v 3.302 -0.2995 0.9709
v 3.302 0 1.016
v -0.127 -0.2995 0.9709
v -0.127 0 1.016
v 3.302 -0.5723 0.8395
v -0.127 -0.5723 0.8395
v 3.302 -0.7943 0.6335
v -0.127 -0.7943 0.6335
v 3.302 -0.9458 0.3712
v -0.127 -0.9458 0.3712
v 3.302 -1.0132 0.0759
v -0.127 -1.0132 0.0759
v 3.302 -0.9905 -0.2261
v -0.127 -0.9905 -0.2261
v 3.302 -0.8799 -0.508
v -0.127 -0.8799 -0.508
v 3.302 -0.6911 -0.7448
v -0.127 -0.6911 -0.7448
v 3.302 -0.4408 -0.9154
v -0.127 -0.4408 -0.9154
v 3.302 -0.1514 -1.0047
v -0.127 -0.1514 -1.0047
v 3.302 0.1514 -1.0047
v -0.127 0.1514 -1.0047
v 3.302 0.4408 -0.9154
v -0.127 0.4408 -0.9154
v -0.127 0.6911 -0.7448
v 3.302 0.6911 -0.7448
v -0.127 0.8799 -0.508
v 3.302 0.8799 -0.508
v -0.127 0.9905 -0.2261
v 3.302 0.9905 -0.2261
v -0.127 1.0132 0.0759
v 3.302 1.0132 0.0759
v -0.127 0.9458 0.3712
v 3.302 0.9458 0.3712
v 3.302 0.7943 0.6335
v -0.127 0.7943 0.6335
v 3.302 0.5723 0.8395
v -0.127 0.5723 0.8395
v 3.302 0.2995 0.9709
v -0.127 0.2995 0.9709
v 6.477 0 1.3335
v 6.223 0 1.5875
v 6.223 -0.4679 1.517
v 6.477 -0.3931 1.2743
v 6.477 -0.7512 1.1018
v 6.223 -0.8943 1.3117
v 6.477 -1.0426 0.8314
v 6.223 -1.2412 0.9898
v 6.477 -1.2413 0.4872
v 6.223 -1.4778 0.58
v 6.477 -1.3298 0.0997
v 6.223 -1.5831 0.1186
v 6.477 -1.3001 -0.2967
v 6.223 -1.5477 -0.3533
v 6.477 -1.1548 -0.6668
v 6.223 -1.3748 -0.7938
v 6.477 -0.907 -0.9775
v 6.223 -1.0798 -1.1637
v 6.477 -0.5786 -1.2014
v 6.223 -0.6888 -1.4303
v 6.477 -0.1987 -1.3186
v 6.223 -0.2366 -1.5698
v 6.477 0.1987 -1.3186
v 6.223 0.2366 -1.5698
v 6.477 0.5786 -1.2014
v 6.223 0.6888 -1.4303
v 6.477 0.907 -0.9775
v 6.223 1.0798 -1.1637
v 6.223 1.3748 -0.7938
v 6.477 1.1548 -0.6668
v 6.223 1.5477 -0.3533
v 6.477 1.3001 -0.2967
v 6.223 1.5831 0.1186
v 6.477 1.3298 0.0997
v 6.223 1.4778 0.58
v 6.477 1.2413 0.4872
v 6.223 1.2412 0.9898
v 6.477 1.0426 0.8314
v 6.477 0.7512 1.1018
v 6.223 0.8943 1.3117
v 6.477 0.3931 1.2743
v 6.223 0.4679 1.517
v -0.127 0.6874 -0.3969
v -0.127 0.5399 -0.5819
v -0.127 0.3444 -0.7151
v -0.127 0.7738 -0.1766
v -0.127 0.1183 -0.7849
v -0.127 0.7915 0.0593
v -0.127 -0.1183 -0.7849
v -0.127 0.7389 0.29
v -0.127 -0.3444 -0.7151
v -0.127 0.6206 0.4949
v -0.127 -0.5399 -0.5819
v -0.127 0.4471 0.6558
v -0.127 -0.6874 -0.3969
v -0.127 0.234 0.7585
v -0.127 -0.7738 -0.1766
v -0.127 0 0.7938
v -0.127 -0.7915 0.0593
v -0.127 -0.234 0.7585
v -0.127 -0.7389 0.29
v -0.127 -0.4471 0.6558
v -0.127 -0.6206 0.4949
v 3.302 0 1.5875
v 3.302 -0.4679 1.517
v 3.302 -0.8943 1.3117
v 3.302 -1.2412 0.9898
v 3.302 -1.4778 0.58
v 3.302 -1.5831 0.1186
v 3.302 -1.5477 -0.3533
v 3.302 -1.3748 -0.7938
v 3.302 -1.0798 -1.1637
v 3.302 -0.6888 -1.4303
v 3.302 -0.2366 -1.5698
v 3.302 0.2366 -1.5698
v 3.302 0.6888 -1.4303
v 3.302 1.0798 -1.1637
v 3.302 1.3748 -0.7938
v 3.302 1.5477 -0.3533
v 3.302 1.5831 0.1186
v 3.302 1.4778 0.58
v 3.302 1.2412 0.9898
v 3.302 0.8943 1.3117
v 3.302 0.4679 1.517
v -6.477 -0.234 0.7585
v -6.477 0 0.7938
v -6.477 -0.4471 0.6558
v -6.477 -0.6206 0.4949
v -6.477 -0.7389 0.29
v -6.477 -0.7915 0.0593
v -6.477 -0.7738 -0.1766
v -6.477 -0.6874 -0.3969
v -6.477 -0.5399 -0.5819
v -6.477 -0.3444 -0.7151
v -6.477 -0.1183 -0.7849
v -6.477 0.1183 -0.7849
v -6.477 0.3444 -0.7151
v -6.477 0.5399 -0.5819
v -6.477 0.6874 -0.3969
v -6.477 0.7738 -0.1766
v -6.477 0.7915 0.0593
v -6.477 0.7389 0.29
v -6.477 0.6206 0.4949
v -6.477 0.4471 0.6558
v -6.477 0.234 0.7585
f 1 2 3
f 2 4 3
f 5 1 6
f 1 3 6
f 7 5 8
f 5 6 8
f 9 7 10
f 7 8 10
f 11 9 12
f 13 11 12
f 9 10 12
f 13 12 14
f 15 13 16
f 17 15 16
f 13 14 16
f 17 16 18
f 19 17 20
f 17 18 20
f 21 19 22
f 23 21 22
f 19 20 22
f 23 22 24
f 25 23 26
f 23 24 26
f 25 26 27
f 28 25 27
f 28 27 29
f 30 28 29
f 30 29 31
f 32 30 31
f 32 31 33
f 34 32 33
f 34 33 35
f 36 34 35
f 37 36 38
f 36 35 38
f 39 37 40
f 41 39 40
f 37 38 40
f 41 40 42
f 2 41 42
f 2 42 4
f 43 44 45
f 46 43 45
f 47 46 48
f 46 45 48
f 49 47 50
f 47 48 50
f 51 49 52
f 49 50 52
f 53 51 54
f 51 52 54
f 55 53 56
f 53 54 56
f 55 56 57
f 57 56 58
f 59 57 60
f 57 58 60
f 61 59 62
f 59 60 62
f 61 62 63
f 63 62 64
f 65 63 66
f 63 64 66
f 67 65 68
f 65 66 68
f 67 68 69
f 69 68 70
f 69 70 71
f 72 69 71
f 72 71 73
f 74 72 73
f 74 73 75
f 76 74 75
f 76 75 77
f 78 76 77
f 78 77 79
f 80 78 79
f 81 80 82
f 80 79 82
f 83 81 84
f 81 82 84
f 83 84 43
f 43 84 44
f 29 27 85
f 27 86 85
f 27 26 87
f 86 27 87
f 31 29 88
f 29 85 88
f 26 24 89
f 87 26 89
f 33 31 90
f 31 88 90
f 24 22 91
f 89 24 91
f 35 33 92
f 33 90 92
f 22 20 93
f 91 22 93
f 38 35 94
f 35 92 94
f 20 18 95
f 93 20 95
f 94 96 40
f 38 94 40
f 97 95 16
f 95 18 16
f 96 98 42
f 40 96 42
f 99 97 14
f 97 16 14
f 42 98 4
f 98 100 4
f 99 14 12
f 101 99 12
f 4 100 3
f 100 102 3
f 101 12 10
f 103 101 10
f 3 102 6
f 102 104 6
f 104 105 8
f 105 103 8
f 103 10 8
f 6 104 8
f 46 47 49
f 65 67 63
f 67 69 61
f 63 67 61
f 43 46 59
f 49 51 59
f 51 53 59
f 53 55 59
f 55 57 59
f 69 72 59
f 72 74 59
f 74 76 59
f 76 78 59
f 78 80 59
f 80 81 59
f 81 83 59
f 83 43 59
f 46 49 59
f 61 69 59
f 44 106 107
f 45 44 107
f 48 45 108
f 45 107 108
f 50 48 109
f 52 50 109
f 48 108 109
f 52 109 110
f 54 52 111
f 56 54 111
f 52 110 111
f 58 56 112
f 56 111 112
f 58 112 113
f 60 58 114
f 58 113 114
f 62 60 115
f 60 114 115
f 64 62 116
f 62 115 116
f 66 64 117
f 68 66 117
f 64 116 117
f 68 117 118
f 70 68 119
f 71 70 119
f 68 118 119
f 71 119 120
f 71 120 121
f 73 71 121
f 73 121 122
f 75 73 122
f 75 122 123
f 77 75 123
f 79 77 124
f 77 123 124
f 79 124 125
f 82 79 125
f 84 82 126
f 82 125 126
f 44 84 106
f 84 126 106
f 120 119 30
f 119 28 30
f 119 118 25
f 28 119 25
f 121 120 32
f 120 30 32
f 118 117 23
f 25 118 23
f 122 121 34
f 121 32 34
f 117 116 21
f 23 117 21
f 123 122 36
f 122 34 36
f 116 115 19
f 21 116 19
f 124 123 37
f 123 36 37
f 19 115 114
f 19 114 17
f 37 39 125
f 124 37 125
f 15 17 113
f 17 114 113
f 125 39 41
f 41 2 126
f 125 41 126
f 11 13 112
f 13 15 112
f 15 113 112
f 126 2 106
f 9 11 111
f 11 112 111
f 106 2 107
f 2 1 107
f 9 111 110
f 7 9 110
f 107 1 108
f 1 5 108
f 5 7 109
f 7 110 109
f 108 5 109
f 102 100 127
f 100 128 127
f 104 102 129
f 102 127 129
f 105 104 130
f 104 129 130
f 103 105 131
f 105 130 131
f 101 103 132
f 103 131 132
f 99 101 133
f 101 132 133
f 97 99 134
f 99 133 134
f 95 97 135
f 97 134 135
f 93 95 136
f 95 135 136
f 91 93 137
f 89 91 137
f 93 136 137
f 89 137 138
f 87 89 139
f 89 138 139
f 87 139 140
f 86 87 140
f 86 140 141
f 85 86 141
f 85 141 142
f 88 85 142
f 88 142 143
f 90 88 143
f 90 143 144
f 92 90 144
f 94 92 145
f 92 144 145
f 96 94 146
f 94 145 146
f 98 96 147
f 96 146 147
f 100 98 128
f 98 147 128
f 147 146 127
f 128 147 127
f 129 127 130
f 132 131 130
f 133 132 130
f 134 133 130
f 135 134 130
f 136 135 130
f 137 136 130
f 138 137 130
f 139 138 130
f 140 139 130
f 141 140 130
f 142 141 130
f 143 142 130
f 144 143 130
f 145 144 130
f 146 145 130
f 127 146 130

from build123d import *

# Parameters (mm, degrees)
CHAMFER1_SIZE = 0.254


with BuildPart() as part:
    # Sketch2 → Revolve1 (revolve)
    with BuildSketch(Plane(origin=(0, 0, 0), x_dir=(1, 0, 0), z_dir=(0, 1, 0)), mode=Mode.PRIVATE) as revolve1_sk:
        Polygon((-6.477, 0), (6.477, 0), (6.477, 1.5875), (3.302, 1.5875), (3.302, 1.016), (-0.127, 1.016), (-0.127, 0.79375), (-6.477, 0.79375), align=None)
    revolve(revolve1_sk.sketch.rotate(Axis((-6.477, 0, 0), (1, 0, 0)), 180), axis=Axis((-6.477, 0, 0), (1, 0, 0)))

    # Chamfer1
    chamfer1_edges = [part.edges().sort_by_distance(p)[0] for p in [
        (6.477, 0, -1.5875),
    ]]
    chamfer(chamfer1_edges, length=CHAMFER1_SIZE)


solid = part.part
